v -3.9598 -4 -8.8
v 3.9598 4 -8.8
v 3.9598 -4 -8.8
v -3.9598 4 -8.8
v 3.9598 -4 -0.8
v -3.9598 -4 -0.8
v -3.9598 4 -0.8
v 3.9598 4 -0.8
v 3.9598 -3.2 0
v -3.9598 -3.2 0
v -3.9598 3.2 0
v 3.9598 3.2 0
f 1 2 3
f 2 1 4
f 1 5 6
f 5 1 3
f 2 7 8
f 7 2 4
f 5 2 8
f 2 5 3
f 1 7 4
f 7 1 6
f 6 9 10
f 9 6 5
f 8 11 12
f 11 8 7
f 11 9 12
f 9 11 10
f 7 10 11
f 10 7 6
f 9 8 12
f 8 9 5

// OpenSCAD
// file: ../p/rect3.scad
use <../lib.scad>
function ldraw_lib__rect3() = [
// 0 Rectangle with 3 Edges
// 0 Name: rect3.dat
// 0 Author: Mark Kennedy [mkennedy]
// 0 !LDRAW_ORG Primitive UPDATE 2010-01
// 0 !LICENSE Licensed under CC BY 4.0 : see CAreadme.txt
// 
// 0 BFC CERTIFY CCW
  [0,"BFC","CERTIFY"],
  [0,"BFC","CCW"],
// 
// 0 !HISTORY 2003-08-01 [PTadmin] Official Update 2003-02
// 0 !HISTORY 2007-06-24 [PTadmin] Header formatted for Contributor Agreement
// 0 !HISTORY 2008-07-01 [PTadmin] Official Update 2008-01
// 0 !HISTORY 2010-01-17 [mikeheide] Change winding to CCW
// 0 !HISTORY 2010-04-05 [PTadmin] Official Update 2010-01
// 
// 
// 2 24 1 0 1 -1 0 1
  [2,24,1,0,1,-1,0,1],
// 2 24 1 0 1 1 0 -1
  [2,24,1,0,1,1,0,-1],
// 2 24 -1 0 1 -1 0 -1
  [2,24,-1,0,1,-1,0,-1],
// 4 16 -1 0 1 -1 0 -1 1 0 -1 1 0 1
  [4,16,-1,0,1,-1,0,-1,1,0,-1,1,0,1],
// 0 //
];
module ldraw_lib__rect3(step=0, col=false, unit=2/5, alt=false, line=0.2, solid=!$preview)
    makepoly(ldraw_lib__rect3(), step=step, col=col, unit=unit, alt=alt, line=line, solid=solid);
ldraw_lib__rect3(line=0.2);
// file: ../p/rect2p.scad
use <../lib.scad>
function ldraw_lib__rect2p() = [
// 0 Rectangle with 2 Parallel Edges
// 0 Name: rect2p.dat
// 0 Author: Donald Sutter [technog]
// 0 !LDRAW_ORG Primitive UPDATE 2010-01
// 0 !LICENSE Licensed under CC BY 4.0 : see CAreadme.txt
// 
// 0 BFC CERTIFY CCW
  [0,"BFC","CERTIFY"],
  [0,"BFC","CCW"],
// 
// 0 !HISTORY 2003-08-01 [PTadmin] Official Update 2003-02
// 0 !HISTORY 2007-06-24 [PTadmin] Header formatted for Contributor Agreement
// 0 !HISTORY 2008-07-01 [PTadmin] Official Update 2008-01
// 0 !HISTORY 2010-01-17 [mikeheide] changed winding to CCW
// 0 !HISTORY 2010-04-05 [PTadmin] Official Update 2010-01
// 
// 
// 2 24 1 0 1 -1 0 1
  [2,24,1,0,1,-1,0,1],
// 2 24 -1 0 -1 1 0 -1
  [2,24,-1,0,-1,1,0,-1],
// 4 16 -1 0 1 -1 0 -1 1 0 -1 1 0 1
  [4,16,-1,0,1,-1,0,-1,1,0,-1,1,0,1],
// 0
];
module ldraw_lib__rect2p(step=0, col=false, unit=2/5, alt=false, line=0.2, solid=!$preview)
    makepoly(ldraw_lib__rect2p(), step=step, col=col, unit=unit, alt=alt, line=line, solid=solid);
ldraw_lib__rect2p(line=0.2);
// file: ../p/box5-2p.scad
use <../lib.scad>
function ldraw_lib__box5_2p() = [
// 0 Box with 5 Faces without 2 Parallel Edges
// 0 Name: box5-2p.dat
// 0 Author: Joerg Sommerer [Brickaneer]
// 0 !LDRAW_ORG Primitive UPDATE 2012-01
// 0 !LICENSE Licensed under CC BY 2.0 and CC BY 4.0 : see CAreadme.txt
// 
// 0 BFC CERTIFY CCW
  [0,"BFC","CERTIFY"],
  [0,"BFC","CCW"],
// 
// 0 !HISTORY 2012-03-30 [PTadmin] Official Update 2012-01
// 
// 
// 2 24 1 1 1 -1 1 1
  [2,24,1,1,1,-1,1,1],
// 2 24 -1 1 1 -1 1 -1
  [2,24,-1,1,1,-1,1,-1],
// 2 24 -1 1 -1 1 1 -1
  [2,24,-1,1,-1,1,1,-1],
// 2 24 1 1 -1 1 1 1
  [2,24,1,1,-1,1,1,1],
// 2 24 1 0 1 1 1 1
  [2,24,1,0,1,1,1,1],
// 2 24 -1 0 1 -1 1 1
  [2,24,-1,0,1,-1,1,1],
// 2 24 1 0 -1 1 1 -1
  [2,24,1,0,-1,1,1,-1],
// 2 24 -1 0 -1 -1 1 -1
  [2,24,-1,0,-1,-1,1,-1],
// 2 24 -1 0 1 -1 0 -1
  [2,24,-1,0,1,-1,0,-1],
// 2 24 1 0 -1 1 0 1
  [2,24,1,0,-1,1,0,1],
// 4 16 1 1 -1 -1 1 -1 -1 1 1 1 1 1
  [4,16,1,1,-1,-1,1,-1,-1,1,1,1,1,1],
// 4 16 -1 1 1 -1 0 1 1 0 1 1 1 1
  [4,16,-1,1,1,-1,0,1,1,0,1,1,1,1],
// 4 16 -1 1 -1 -1 0 -1 -1 0 1 -1 1 1
  [4,16,-1,1,-1,-1,0,-1,-1,0,1,-1,1,1],
// 4 16 1 1 -1 1 0 -1 -1 0 -1 -1 1 -1
  [4,16,1,1,-1,1,0,-1,-1,0,-1,-1,1,-1],
// 4 16 1 1 1 1 0 1 1 0 -1 1 1 -1
  [4,16,1,1,1,1,0,1,1,0,-1,1,1,-1],
];
module ldraw_lib__box5_2p(step=0, col=false, unit=2/5, alt=false, line=0.2, solid=!$preview)
    makepoly(ldraw_lib__box5_2p(), step=step, col=col, unit=unit, alt=alt, line=line, solid=solid);
ldraw_lib__box5_2p(line=0.2);
// main file
use <../lib.scad>
use <../p/box5-2p.scad>
use <../p/rect2p.scad>
use <../p/rect3.scad>
function ldraw_lib__35544() = [
// 0 ~Electric Powered Up Remote Handset Stop Button
// 0 Name: 35544.dat
// 0 Author: Philippe Hurbain [Philo]
// 0 !LDRAW_ORG Part UPDATE 2020-01
// 0 !LICENSE Licensed under CC BY 4.0 : see CAreadme.txt
// 
// 0 BFC CERTIFY CCW
  [0,"BFC","CERTIFY"],
  [0,"BFC","CCW"],
// 
// 0 !HISTORY 2020-06-28 [PTadmin] Official Update 2020-01
// 
// 
// 1 16 0 2 0 0 0 9.8994 0 20 0 10 0 0 box5-2p.dat
  [1,16,0,2,0,0,0,9.8994,0,20,0,10,0,0, ldraw_lib__box5_2p()],
// 1 16 0 1 -9 9.8994 0 0 0 1 -1 0 0 1 rect3.dat
  [1,16,0,1,-9,9.8994,0,0,0,1,-1,0,0,1, ldraw_lib__rect3()],
// 1 16 0 1 9 -9.8994 0 0 0 1 -1 0 0 -1 rect3.dat
  [1,16,0,1,9,-9.8994,0,0,0,1,-1,0,0,-1, ldraw_lib__rect3()],
// 1 16 0 0 0 0 0 -9.8994 0 1 0 8 0 0 rect2p.dat
  [1,16,0,0,0,0,0,-9.8994,0,1,0,8,0,0, ldraw_lib__rect2p()],
// 4 16 -9.8994 2 -10 -9.8994 0 -8 -9.8994 0 8 -9.8994 2 10
  [4,16,-9.8994,2,-10,-9.8994,0,-8,-9.8994,0,8,-9.8994,2,10],
// 4 16 9.8994 0 8 9.8994 0 -8 9.8994 2 -10 9.8994 2 10
  [4,16,9.8994,0,8,9.8994,0,-8,9.8994,2,-10,9.8994,2,10],
];
module ldraw_lib__35544(step=0, col=false, unit=2/5, alt=false, line=0.2, solid=!$preview)
    makepoly(ldraw_lib__35544(), step=step, col=col, unit=unit, alt=alt, line=line, solid=solid);
ldraw_lib__35544(line=0.2);
